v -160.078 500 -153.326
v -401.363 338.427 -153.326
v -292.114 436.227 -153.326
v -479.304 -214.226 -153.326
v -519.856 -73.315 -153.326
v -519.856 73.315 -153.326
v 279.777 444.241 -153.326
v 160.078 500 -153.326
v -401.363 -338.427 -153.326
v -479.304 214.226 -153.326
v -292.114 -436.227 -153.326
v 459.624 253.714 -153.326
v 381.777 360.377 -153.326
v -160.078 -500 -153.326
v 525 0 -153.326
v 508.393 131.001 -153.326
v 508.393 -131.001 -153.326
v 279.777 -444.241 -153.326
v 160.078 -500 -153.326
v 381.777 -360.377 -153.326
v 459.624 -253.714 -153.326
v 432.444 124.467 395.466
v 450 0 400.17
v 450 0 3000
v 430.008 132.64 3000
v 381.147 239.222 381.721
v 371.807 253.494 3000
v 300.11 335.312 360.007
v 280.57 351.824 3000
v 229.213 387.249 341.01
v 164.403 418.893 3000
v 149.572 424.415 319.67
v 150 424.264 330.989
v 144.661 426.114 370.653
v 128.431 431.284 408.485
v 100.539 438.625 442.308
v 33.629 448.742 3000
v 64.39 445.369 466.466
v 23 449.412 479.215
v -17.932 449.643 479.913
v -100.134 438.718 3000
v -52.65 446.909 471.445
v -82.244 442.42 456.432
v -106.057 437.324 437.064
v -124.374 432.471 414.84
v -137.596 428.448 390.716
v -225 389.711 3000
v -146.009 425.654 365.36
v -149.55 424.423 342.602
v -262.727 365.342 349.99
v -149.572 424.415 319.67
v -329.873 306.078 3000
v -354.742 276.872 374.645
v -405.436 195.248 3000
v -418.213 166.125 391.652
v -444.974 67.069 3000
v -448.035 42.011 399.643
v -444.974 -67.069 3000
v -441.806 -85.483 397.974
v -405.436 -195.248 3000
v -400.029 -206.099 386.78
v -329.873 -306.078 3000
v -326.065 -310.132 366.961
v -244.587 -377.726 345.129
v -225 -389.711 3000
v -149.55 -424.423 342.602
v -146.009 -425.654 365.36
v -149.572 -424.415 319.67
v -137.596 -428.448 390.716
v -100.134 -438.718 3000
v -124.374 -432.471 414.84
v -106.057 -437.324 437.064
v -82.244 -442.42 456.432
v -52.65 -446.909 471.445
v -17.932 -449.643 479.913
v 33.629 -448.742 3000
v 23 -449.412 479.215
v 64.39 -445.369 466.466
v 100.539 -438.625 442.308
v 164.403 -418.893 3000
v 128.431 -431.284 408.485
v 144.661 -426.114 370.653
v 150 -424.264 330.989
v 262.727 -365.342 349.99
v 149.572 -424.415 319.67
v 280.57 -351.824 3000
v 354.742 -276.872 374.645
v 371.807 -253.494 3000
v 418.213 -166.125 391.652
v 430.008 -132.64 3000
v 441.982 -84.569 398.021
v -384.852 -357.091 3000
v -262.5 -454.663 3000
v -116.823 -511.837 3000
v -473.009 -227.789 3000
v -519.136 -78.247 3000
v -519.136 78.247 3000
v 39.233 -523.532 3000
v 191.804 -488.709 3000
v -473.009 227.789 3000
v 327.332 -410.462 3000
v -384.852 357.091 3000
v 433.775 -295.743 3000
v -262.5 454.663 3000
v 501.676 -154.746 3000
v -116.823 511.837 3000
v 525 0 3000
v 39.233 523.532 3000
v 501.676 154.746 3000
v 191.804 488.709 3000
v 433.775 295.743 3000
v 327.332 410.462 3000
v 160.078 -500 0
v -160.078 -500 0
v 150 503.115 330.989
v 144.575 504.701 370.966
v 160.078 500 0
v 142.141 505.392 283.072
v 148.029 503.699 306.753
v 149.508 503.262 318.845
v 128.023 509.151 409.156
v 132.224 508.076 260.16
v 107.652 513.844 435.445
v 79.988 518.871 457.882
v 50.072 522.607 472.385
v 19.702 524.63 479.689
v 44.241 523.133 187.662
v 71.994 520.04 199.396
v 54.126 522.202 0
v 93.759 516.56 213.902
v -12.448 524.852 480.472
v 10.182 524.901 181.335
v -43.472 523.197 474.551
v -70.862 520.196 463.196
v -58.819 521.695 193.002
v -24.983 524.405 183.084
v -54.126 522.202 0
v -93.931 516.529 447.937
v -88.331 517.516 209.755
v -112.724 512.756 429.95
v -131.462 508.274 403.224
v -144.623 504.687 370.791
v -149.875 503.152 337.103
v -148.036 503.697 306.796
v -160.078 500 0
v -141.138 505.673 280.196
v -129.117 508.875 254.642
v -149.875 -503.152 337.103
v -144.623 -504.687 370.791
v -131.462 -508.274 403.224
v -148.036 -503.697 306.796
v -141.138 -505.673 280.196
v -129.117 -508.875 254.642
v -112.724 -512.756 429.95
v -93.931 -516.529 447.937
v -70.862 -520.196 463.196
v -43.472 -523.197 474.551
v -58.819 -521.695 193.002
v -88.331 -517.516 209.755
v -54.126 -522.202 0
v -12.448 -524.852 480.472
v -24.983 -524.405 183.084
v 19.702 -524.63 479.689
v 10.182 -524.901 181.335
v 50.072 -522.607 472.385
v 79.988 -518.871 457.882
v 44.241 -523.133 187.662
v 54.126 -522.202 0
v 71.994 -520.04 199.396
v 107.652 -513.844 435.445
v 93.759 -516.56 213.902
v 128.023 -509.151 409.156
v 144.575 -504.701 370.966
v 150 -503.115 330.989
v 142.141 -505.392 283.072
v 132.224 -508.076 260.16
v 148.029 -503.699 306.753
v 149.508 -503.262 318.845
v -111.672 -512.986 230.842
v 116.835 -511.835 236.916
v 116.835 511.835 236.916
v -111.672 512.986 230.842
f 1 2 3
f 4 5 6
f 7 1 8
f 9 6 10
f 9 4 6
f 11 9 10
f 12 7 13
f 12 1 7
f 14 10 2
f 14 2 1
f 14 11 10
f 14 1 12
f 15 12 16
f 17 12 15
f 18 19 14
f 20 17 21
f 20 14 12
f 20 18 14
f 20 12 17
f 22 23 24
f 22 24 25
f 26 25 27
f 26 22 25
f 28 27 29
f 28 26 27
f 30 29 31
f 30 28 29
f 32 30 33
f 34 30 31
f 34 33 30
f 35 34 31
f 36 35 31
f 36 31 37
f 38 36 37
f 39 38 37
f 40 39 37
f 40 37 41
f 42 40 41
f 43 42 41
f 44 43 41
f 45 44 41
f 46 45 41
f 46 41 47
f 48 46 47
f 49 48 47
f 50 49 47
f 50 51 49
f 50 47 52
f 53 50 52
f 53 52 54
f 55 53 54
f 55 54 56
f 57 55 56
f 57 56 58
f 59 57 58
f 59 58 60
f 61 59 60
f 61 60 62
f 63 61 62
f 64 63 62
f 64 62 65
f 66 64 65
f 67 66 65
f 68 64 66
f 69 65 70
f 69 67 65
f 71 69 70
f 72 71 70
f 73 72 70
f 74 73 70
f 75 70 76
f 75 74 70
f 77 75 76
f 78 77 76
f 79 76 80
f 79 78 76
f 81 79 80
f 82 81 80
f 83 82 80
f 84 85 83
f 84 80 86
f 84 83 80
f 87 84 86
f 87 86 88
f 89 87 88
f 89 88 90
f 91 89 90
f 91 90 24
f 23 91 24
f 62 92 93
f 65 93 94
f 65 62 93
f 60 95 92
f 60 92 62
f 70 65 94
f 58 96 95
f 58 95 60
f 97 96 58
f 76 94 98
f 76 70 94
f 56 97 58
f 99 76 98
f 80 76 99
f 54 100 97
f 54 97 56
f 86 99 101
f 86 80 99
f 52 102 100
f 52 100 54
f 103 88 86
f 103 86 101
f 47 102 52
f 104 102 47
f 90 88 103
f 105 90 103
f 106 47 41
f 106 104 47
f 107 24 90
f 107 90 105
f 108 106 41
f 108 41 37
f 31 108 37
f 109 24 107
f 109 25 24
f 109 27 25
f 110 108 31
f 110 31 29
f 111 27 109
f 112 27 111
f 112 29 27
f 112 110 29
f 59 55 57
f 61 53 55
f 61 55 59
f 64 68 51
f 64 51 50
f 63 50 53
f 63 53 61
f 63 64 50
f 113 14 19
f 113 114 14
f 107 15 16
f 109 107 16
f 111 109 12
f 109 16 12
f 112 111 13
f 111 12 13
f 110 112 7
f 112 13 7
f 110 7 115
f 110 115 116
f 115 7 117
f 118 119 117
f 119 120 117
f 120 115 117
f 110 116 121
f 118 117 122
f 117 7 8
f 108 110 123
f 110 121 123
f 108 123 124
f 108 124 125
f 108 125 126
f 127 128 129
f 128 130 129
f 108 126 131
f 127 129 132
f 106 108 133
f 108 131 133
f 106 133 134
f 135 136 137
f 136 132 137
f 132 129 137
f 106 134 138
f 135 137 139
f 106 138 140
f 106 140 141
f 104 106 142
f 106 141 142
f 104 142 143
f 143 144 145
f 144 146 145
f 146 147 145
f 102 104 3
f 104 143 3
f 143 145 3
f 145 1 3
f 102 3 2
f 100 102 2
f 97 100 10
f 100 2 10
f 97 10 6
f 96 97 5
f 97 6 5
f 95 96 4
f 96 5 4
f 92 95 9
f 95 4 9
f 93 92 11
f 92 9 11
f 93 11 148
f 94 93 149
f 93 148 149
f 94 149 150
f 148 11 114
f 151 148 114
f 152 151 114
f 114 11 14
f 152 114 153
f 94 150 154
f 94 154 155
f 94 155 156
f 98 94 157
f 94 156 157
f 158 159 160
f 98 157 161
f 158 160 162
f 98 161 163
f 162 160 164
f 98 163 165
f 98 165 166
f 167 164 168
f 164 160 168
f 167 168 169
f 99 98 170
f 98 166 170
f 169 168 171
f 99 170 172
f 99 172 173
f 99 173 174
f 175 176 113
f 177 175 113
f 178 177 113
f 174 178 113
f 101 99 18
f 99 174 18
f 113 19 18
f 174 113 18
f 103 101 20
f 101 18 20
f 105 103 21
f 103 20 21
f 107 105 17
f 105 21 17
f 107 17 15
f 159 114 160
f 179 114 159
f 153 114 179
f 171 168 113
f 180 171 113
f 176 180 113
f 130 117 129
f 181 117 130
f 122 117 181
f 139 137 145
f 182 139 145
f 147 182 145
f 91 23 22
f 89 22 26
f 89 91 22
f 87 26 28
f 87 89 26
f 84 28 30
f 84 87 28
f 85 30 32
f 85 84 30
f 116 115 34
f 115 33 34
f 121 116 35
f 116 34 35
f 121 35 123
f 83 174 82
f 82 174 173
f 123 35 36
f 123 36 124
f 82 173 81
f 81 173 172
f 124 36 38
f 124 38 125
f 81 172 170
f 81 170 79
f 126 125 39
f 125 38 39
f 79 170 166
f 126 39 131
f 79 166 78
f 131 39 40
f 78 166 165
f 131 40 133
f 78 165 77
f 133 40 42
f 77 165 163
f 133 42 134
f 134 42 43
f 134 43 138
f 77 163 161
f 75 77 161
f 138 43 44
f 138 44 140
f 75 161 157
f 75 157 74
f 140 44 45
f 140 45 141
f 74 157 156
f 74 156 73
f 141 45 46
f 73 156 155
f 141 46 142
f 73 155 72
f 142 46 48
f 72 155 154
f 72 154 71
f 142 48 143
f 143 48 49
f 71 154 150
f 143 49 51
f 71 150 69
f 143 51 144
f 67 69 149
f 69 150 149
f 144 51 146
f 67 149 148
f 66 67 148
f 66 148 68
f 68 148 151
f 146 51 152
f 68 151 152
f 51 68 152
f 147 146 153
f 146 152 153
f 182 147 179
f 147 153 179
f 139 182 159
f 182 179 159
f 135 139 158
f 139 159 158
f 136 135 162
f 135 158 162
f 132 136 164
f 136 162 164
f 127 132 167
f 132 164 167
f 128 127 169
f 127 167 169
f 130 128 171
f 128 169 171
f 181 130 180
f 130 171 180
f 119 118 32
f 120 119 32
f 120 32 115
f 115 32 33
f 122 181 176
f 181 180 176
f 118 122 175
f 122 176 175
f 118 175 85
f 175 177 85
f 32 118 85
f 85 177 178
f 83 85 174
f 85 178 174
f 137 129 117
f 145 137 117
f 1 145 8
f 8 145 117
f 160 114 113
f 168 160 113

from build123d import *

# Parameters (mm, degrees)
F0_R     = 525
F0_R_2   = 450
F1_DEPTH = 3000
F3_DEPTH = 500
F4_W     = 1649.553597
F4_H     = 1255.804241
F4_R     = 525
F5_DEPTH = 7000
F6_R     = 150
F7_DEPTH = 550


with BuildPart() as f1:
    # F0 (on Top) → F1 (new body)
    with BuildSketch(Plane.XY):
        Circle(F0_R)
        Circle(F0_R_2, mode=Mode.SUBTRACT)
    extrude(amount=F1_DEPTH)

    # F2 (on Front) → F3 (join, symmetric)
    with BuildSketch(Plane.XZ):
        Polygon((736.250953, 476.870411), (0, 279.592563), (-736.250953, 476.870411), (-736.250953, -153.325768), (736.250953, -153.325768), align=None)
    extrude(amount=F3_DEPTH, both=True)

    # F4 (on face) → F5 (cut)
    with BuildSketch(Plane.XY.offset(3000)):
        with Locations((44.825762, 18.989593)):
            Rectangle(F4_W, F4_H)
        Circle(F4_R, mode=Mode.SUBTRACT)
    extrude(amount=-F5_DEPTH, mode=Mode.SUBTRACT)

    # F6 (on Front) → F7 (cut, symmetric)
    with BuildSketch(Plane.XZ):
        with Locations((0, 330.988973)):
            Circle(F6_R)
    extrude(amount=F7_DEPTH, both=True, mode=Mode.SUBTRACT)


solid = f1.part
